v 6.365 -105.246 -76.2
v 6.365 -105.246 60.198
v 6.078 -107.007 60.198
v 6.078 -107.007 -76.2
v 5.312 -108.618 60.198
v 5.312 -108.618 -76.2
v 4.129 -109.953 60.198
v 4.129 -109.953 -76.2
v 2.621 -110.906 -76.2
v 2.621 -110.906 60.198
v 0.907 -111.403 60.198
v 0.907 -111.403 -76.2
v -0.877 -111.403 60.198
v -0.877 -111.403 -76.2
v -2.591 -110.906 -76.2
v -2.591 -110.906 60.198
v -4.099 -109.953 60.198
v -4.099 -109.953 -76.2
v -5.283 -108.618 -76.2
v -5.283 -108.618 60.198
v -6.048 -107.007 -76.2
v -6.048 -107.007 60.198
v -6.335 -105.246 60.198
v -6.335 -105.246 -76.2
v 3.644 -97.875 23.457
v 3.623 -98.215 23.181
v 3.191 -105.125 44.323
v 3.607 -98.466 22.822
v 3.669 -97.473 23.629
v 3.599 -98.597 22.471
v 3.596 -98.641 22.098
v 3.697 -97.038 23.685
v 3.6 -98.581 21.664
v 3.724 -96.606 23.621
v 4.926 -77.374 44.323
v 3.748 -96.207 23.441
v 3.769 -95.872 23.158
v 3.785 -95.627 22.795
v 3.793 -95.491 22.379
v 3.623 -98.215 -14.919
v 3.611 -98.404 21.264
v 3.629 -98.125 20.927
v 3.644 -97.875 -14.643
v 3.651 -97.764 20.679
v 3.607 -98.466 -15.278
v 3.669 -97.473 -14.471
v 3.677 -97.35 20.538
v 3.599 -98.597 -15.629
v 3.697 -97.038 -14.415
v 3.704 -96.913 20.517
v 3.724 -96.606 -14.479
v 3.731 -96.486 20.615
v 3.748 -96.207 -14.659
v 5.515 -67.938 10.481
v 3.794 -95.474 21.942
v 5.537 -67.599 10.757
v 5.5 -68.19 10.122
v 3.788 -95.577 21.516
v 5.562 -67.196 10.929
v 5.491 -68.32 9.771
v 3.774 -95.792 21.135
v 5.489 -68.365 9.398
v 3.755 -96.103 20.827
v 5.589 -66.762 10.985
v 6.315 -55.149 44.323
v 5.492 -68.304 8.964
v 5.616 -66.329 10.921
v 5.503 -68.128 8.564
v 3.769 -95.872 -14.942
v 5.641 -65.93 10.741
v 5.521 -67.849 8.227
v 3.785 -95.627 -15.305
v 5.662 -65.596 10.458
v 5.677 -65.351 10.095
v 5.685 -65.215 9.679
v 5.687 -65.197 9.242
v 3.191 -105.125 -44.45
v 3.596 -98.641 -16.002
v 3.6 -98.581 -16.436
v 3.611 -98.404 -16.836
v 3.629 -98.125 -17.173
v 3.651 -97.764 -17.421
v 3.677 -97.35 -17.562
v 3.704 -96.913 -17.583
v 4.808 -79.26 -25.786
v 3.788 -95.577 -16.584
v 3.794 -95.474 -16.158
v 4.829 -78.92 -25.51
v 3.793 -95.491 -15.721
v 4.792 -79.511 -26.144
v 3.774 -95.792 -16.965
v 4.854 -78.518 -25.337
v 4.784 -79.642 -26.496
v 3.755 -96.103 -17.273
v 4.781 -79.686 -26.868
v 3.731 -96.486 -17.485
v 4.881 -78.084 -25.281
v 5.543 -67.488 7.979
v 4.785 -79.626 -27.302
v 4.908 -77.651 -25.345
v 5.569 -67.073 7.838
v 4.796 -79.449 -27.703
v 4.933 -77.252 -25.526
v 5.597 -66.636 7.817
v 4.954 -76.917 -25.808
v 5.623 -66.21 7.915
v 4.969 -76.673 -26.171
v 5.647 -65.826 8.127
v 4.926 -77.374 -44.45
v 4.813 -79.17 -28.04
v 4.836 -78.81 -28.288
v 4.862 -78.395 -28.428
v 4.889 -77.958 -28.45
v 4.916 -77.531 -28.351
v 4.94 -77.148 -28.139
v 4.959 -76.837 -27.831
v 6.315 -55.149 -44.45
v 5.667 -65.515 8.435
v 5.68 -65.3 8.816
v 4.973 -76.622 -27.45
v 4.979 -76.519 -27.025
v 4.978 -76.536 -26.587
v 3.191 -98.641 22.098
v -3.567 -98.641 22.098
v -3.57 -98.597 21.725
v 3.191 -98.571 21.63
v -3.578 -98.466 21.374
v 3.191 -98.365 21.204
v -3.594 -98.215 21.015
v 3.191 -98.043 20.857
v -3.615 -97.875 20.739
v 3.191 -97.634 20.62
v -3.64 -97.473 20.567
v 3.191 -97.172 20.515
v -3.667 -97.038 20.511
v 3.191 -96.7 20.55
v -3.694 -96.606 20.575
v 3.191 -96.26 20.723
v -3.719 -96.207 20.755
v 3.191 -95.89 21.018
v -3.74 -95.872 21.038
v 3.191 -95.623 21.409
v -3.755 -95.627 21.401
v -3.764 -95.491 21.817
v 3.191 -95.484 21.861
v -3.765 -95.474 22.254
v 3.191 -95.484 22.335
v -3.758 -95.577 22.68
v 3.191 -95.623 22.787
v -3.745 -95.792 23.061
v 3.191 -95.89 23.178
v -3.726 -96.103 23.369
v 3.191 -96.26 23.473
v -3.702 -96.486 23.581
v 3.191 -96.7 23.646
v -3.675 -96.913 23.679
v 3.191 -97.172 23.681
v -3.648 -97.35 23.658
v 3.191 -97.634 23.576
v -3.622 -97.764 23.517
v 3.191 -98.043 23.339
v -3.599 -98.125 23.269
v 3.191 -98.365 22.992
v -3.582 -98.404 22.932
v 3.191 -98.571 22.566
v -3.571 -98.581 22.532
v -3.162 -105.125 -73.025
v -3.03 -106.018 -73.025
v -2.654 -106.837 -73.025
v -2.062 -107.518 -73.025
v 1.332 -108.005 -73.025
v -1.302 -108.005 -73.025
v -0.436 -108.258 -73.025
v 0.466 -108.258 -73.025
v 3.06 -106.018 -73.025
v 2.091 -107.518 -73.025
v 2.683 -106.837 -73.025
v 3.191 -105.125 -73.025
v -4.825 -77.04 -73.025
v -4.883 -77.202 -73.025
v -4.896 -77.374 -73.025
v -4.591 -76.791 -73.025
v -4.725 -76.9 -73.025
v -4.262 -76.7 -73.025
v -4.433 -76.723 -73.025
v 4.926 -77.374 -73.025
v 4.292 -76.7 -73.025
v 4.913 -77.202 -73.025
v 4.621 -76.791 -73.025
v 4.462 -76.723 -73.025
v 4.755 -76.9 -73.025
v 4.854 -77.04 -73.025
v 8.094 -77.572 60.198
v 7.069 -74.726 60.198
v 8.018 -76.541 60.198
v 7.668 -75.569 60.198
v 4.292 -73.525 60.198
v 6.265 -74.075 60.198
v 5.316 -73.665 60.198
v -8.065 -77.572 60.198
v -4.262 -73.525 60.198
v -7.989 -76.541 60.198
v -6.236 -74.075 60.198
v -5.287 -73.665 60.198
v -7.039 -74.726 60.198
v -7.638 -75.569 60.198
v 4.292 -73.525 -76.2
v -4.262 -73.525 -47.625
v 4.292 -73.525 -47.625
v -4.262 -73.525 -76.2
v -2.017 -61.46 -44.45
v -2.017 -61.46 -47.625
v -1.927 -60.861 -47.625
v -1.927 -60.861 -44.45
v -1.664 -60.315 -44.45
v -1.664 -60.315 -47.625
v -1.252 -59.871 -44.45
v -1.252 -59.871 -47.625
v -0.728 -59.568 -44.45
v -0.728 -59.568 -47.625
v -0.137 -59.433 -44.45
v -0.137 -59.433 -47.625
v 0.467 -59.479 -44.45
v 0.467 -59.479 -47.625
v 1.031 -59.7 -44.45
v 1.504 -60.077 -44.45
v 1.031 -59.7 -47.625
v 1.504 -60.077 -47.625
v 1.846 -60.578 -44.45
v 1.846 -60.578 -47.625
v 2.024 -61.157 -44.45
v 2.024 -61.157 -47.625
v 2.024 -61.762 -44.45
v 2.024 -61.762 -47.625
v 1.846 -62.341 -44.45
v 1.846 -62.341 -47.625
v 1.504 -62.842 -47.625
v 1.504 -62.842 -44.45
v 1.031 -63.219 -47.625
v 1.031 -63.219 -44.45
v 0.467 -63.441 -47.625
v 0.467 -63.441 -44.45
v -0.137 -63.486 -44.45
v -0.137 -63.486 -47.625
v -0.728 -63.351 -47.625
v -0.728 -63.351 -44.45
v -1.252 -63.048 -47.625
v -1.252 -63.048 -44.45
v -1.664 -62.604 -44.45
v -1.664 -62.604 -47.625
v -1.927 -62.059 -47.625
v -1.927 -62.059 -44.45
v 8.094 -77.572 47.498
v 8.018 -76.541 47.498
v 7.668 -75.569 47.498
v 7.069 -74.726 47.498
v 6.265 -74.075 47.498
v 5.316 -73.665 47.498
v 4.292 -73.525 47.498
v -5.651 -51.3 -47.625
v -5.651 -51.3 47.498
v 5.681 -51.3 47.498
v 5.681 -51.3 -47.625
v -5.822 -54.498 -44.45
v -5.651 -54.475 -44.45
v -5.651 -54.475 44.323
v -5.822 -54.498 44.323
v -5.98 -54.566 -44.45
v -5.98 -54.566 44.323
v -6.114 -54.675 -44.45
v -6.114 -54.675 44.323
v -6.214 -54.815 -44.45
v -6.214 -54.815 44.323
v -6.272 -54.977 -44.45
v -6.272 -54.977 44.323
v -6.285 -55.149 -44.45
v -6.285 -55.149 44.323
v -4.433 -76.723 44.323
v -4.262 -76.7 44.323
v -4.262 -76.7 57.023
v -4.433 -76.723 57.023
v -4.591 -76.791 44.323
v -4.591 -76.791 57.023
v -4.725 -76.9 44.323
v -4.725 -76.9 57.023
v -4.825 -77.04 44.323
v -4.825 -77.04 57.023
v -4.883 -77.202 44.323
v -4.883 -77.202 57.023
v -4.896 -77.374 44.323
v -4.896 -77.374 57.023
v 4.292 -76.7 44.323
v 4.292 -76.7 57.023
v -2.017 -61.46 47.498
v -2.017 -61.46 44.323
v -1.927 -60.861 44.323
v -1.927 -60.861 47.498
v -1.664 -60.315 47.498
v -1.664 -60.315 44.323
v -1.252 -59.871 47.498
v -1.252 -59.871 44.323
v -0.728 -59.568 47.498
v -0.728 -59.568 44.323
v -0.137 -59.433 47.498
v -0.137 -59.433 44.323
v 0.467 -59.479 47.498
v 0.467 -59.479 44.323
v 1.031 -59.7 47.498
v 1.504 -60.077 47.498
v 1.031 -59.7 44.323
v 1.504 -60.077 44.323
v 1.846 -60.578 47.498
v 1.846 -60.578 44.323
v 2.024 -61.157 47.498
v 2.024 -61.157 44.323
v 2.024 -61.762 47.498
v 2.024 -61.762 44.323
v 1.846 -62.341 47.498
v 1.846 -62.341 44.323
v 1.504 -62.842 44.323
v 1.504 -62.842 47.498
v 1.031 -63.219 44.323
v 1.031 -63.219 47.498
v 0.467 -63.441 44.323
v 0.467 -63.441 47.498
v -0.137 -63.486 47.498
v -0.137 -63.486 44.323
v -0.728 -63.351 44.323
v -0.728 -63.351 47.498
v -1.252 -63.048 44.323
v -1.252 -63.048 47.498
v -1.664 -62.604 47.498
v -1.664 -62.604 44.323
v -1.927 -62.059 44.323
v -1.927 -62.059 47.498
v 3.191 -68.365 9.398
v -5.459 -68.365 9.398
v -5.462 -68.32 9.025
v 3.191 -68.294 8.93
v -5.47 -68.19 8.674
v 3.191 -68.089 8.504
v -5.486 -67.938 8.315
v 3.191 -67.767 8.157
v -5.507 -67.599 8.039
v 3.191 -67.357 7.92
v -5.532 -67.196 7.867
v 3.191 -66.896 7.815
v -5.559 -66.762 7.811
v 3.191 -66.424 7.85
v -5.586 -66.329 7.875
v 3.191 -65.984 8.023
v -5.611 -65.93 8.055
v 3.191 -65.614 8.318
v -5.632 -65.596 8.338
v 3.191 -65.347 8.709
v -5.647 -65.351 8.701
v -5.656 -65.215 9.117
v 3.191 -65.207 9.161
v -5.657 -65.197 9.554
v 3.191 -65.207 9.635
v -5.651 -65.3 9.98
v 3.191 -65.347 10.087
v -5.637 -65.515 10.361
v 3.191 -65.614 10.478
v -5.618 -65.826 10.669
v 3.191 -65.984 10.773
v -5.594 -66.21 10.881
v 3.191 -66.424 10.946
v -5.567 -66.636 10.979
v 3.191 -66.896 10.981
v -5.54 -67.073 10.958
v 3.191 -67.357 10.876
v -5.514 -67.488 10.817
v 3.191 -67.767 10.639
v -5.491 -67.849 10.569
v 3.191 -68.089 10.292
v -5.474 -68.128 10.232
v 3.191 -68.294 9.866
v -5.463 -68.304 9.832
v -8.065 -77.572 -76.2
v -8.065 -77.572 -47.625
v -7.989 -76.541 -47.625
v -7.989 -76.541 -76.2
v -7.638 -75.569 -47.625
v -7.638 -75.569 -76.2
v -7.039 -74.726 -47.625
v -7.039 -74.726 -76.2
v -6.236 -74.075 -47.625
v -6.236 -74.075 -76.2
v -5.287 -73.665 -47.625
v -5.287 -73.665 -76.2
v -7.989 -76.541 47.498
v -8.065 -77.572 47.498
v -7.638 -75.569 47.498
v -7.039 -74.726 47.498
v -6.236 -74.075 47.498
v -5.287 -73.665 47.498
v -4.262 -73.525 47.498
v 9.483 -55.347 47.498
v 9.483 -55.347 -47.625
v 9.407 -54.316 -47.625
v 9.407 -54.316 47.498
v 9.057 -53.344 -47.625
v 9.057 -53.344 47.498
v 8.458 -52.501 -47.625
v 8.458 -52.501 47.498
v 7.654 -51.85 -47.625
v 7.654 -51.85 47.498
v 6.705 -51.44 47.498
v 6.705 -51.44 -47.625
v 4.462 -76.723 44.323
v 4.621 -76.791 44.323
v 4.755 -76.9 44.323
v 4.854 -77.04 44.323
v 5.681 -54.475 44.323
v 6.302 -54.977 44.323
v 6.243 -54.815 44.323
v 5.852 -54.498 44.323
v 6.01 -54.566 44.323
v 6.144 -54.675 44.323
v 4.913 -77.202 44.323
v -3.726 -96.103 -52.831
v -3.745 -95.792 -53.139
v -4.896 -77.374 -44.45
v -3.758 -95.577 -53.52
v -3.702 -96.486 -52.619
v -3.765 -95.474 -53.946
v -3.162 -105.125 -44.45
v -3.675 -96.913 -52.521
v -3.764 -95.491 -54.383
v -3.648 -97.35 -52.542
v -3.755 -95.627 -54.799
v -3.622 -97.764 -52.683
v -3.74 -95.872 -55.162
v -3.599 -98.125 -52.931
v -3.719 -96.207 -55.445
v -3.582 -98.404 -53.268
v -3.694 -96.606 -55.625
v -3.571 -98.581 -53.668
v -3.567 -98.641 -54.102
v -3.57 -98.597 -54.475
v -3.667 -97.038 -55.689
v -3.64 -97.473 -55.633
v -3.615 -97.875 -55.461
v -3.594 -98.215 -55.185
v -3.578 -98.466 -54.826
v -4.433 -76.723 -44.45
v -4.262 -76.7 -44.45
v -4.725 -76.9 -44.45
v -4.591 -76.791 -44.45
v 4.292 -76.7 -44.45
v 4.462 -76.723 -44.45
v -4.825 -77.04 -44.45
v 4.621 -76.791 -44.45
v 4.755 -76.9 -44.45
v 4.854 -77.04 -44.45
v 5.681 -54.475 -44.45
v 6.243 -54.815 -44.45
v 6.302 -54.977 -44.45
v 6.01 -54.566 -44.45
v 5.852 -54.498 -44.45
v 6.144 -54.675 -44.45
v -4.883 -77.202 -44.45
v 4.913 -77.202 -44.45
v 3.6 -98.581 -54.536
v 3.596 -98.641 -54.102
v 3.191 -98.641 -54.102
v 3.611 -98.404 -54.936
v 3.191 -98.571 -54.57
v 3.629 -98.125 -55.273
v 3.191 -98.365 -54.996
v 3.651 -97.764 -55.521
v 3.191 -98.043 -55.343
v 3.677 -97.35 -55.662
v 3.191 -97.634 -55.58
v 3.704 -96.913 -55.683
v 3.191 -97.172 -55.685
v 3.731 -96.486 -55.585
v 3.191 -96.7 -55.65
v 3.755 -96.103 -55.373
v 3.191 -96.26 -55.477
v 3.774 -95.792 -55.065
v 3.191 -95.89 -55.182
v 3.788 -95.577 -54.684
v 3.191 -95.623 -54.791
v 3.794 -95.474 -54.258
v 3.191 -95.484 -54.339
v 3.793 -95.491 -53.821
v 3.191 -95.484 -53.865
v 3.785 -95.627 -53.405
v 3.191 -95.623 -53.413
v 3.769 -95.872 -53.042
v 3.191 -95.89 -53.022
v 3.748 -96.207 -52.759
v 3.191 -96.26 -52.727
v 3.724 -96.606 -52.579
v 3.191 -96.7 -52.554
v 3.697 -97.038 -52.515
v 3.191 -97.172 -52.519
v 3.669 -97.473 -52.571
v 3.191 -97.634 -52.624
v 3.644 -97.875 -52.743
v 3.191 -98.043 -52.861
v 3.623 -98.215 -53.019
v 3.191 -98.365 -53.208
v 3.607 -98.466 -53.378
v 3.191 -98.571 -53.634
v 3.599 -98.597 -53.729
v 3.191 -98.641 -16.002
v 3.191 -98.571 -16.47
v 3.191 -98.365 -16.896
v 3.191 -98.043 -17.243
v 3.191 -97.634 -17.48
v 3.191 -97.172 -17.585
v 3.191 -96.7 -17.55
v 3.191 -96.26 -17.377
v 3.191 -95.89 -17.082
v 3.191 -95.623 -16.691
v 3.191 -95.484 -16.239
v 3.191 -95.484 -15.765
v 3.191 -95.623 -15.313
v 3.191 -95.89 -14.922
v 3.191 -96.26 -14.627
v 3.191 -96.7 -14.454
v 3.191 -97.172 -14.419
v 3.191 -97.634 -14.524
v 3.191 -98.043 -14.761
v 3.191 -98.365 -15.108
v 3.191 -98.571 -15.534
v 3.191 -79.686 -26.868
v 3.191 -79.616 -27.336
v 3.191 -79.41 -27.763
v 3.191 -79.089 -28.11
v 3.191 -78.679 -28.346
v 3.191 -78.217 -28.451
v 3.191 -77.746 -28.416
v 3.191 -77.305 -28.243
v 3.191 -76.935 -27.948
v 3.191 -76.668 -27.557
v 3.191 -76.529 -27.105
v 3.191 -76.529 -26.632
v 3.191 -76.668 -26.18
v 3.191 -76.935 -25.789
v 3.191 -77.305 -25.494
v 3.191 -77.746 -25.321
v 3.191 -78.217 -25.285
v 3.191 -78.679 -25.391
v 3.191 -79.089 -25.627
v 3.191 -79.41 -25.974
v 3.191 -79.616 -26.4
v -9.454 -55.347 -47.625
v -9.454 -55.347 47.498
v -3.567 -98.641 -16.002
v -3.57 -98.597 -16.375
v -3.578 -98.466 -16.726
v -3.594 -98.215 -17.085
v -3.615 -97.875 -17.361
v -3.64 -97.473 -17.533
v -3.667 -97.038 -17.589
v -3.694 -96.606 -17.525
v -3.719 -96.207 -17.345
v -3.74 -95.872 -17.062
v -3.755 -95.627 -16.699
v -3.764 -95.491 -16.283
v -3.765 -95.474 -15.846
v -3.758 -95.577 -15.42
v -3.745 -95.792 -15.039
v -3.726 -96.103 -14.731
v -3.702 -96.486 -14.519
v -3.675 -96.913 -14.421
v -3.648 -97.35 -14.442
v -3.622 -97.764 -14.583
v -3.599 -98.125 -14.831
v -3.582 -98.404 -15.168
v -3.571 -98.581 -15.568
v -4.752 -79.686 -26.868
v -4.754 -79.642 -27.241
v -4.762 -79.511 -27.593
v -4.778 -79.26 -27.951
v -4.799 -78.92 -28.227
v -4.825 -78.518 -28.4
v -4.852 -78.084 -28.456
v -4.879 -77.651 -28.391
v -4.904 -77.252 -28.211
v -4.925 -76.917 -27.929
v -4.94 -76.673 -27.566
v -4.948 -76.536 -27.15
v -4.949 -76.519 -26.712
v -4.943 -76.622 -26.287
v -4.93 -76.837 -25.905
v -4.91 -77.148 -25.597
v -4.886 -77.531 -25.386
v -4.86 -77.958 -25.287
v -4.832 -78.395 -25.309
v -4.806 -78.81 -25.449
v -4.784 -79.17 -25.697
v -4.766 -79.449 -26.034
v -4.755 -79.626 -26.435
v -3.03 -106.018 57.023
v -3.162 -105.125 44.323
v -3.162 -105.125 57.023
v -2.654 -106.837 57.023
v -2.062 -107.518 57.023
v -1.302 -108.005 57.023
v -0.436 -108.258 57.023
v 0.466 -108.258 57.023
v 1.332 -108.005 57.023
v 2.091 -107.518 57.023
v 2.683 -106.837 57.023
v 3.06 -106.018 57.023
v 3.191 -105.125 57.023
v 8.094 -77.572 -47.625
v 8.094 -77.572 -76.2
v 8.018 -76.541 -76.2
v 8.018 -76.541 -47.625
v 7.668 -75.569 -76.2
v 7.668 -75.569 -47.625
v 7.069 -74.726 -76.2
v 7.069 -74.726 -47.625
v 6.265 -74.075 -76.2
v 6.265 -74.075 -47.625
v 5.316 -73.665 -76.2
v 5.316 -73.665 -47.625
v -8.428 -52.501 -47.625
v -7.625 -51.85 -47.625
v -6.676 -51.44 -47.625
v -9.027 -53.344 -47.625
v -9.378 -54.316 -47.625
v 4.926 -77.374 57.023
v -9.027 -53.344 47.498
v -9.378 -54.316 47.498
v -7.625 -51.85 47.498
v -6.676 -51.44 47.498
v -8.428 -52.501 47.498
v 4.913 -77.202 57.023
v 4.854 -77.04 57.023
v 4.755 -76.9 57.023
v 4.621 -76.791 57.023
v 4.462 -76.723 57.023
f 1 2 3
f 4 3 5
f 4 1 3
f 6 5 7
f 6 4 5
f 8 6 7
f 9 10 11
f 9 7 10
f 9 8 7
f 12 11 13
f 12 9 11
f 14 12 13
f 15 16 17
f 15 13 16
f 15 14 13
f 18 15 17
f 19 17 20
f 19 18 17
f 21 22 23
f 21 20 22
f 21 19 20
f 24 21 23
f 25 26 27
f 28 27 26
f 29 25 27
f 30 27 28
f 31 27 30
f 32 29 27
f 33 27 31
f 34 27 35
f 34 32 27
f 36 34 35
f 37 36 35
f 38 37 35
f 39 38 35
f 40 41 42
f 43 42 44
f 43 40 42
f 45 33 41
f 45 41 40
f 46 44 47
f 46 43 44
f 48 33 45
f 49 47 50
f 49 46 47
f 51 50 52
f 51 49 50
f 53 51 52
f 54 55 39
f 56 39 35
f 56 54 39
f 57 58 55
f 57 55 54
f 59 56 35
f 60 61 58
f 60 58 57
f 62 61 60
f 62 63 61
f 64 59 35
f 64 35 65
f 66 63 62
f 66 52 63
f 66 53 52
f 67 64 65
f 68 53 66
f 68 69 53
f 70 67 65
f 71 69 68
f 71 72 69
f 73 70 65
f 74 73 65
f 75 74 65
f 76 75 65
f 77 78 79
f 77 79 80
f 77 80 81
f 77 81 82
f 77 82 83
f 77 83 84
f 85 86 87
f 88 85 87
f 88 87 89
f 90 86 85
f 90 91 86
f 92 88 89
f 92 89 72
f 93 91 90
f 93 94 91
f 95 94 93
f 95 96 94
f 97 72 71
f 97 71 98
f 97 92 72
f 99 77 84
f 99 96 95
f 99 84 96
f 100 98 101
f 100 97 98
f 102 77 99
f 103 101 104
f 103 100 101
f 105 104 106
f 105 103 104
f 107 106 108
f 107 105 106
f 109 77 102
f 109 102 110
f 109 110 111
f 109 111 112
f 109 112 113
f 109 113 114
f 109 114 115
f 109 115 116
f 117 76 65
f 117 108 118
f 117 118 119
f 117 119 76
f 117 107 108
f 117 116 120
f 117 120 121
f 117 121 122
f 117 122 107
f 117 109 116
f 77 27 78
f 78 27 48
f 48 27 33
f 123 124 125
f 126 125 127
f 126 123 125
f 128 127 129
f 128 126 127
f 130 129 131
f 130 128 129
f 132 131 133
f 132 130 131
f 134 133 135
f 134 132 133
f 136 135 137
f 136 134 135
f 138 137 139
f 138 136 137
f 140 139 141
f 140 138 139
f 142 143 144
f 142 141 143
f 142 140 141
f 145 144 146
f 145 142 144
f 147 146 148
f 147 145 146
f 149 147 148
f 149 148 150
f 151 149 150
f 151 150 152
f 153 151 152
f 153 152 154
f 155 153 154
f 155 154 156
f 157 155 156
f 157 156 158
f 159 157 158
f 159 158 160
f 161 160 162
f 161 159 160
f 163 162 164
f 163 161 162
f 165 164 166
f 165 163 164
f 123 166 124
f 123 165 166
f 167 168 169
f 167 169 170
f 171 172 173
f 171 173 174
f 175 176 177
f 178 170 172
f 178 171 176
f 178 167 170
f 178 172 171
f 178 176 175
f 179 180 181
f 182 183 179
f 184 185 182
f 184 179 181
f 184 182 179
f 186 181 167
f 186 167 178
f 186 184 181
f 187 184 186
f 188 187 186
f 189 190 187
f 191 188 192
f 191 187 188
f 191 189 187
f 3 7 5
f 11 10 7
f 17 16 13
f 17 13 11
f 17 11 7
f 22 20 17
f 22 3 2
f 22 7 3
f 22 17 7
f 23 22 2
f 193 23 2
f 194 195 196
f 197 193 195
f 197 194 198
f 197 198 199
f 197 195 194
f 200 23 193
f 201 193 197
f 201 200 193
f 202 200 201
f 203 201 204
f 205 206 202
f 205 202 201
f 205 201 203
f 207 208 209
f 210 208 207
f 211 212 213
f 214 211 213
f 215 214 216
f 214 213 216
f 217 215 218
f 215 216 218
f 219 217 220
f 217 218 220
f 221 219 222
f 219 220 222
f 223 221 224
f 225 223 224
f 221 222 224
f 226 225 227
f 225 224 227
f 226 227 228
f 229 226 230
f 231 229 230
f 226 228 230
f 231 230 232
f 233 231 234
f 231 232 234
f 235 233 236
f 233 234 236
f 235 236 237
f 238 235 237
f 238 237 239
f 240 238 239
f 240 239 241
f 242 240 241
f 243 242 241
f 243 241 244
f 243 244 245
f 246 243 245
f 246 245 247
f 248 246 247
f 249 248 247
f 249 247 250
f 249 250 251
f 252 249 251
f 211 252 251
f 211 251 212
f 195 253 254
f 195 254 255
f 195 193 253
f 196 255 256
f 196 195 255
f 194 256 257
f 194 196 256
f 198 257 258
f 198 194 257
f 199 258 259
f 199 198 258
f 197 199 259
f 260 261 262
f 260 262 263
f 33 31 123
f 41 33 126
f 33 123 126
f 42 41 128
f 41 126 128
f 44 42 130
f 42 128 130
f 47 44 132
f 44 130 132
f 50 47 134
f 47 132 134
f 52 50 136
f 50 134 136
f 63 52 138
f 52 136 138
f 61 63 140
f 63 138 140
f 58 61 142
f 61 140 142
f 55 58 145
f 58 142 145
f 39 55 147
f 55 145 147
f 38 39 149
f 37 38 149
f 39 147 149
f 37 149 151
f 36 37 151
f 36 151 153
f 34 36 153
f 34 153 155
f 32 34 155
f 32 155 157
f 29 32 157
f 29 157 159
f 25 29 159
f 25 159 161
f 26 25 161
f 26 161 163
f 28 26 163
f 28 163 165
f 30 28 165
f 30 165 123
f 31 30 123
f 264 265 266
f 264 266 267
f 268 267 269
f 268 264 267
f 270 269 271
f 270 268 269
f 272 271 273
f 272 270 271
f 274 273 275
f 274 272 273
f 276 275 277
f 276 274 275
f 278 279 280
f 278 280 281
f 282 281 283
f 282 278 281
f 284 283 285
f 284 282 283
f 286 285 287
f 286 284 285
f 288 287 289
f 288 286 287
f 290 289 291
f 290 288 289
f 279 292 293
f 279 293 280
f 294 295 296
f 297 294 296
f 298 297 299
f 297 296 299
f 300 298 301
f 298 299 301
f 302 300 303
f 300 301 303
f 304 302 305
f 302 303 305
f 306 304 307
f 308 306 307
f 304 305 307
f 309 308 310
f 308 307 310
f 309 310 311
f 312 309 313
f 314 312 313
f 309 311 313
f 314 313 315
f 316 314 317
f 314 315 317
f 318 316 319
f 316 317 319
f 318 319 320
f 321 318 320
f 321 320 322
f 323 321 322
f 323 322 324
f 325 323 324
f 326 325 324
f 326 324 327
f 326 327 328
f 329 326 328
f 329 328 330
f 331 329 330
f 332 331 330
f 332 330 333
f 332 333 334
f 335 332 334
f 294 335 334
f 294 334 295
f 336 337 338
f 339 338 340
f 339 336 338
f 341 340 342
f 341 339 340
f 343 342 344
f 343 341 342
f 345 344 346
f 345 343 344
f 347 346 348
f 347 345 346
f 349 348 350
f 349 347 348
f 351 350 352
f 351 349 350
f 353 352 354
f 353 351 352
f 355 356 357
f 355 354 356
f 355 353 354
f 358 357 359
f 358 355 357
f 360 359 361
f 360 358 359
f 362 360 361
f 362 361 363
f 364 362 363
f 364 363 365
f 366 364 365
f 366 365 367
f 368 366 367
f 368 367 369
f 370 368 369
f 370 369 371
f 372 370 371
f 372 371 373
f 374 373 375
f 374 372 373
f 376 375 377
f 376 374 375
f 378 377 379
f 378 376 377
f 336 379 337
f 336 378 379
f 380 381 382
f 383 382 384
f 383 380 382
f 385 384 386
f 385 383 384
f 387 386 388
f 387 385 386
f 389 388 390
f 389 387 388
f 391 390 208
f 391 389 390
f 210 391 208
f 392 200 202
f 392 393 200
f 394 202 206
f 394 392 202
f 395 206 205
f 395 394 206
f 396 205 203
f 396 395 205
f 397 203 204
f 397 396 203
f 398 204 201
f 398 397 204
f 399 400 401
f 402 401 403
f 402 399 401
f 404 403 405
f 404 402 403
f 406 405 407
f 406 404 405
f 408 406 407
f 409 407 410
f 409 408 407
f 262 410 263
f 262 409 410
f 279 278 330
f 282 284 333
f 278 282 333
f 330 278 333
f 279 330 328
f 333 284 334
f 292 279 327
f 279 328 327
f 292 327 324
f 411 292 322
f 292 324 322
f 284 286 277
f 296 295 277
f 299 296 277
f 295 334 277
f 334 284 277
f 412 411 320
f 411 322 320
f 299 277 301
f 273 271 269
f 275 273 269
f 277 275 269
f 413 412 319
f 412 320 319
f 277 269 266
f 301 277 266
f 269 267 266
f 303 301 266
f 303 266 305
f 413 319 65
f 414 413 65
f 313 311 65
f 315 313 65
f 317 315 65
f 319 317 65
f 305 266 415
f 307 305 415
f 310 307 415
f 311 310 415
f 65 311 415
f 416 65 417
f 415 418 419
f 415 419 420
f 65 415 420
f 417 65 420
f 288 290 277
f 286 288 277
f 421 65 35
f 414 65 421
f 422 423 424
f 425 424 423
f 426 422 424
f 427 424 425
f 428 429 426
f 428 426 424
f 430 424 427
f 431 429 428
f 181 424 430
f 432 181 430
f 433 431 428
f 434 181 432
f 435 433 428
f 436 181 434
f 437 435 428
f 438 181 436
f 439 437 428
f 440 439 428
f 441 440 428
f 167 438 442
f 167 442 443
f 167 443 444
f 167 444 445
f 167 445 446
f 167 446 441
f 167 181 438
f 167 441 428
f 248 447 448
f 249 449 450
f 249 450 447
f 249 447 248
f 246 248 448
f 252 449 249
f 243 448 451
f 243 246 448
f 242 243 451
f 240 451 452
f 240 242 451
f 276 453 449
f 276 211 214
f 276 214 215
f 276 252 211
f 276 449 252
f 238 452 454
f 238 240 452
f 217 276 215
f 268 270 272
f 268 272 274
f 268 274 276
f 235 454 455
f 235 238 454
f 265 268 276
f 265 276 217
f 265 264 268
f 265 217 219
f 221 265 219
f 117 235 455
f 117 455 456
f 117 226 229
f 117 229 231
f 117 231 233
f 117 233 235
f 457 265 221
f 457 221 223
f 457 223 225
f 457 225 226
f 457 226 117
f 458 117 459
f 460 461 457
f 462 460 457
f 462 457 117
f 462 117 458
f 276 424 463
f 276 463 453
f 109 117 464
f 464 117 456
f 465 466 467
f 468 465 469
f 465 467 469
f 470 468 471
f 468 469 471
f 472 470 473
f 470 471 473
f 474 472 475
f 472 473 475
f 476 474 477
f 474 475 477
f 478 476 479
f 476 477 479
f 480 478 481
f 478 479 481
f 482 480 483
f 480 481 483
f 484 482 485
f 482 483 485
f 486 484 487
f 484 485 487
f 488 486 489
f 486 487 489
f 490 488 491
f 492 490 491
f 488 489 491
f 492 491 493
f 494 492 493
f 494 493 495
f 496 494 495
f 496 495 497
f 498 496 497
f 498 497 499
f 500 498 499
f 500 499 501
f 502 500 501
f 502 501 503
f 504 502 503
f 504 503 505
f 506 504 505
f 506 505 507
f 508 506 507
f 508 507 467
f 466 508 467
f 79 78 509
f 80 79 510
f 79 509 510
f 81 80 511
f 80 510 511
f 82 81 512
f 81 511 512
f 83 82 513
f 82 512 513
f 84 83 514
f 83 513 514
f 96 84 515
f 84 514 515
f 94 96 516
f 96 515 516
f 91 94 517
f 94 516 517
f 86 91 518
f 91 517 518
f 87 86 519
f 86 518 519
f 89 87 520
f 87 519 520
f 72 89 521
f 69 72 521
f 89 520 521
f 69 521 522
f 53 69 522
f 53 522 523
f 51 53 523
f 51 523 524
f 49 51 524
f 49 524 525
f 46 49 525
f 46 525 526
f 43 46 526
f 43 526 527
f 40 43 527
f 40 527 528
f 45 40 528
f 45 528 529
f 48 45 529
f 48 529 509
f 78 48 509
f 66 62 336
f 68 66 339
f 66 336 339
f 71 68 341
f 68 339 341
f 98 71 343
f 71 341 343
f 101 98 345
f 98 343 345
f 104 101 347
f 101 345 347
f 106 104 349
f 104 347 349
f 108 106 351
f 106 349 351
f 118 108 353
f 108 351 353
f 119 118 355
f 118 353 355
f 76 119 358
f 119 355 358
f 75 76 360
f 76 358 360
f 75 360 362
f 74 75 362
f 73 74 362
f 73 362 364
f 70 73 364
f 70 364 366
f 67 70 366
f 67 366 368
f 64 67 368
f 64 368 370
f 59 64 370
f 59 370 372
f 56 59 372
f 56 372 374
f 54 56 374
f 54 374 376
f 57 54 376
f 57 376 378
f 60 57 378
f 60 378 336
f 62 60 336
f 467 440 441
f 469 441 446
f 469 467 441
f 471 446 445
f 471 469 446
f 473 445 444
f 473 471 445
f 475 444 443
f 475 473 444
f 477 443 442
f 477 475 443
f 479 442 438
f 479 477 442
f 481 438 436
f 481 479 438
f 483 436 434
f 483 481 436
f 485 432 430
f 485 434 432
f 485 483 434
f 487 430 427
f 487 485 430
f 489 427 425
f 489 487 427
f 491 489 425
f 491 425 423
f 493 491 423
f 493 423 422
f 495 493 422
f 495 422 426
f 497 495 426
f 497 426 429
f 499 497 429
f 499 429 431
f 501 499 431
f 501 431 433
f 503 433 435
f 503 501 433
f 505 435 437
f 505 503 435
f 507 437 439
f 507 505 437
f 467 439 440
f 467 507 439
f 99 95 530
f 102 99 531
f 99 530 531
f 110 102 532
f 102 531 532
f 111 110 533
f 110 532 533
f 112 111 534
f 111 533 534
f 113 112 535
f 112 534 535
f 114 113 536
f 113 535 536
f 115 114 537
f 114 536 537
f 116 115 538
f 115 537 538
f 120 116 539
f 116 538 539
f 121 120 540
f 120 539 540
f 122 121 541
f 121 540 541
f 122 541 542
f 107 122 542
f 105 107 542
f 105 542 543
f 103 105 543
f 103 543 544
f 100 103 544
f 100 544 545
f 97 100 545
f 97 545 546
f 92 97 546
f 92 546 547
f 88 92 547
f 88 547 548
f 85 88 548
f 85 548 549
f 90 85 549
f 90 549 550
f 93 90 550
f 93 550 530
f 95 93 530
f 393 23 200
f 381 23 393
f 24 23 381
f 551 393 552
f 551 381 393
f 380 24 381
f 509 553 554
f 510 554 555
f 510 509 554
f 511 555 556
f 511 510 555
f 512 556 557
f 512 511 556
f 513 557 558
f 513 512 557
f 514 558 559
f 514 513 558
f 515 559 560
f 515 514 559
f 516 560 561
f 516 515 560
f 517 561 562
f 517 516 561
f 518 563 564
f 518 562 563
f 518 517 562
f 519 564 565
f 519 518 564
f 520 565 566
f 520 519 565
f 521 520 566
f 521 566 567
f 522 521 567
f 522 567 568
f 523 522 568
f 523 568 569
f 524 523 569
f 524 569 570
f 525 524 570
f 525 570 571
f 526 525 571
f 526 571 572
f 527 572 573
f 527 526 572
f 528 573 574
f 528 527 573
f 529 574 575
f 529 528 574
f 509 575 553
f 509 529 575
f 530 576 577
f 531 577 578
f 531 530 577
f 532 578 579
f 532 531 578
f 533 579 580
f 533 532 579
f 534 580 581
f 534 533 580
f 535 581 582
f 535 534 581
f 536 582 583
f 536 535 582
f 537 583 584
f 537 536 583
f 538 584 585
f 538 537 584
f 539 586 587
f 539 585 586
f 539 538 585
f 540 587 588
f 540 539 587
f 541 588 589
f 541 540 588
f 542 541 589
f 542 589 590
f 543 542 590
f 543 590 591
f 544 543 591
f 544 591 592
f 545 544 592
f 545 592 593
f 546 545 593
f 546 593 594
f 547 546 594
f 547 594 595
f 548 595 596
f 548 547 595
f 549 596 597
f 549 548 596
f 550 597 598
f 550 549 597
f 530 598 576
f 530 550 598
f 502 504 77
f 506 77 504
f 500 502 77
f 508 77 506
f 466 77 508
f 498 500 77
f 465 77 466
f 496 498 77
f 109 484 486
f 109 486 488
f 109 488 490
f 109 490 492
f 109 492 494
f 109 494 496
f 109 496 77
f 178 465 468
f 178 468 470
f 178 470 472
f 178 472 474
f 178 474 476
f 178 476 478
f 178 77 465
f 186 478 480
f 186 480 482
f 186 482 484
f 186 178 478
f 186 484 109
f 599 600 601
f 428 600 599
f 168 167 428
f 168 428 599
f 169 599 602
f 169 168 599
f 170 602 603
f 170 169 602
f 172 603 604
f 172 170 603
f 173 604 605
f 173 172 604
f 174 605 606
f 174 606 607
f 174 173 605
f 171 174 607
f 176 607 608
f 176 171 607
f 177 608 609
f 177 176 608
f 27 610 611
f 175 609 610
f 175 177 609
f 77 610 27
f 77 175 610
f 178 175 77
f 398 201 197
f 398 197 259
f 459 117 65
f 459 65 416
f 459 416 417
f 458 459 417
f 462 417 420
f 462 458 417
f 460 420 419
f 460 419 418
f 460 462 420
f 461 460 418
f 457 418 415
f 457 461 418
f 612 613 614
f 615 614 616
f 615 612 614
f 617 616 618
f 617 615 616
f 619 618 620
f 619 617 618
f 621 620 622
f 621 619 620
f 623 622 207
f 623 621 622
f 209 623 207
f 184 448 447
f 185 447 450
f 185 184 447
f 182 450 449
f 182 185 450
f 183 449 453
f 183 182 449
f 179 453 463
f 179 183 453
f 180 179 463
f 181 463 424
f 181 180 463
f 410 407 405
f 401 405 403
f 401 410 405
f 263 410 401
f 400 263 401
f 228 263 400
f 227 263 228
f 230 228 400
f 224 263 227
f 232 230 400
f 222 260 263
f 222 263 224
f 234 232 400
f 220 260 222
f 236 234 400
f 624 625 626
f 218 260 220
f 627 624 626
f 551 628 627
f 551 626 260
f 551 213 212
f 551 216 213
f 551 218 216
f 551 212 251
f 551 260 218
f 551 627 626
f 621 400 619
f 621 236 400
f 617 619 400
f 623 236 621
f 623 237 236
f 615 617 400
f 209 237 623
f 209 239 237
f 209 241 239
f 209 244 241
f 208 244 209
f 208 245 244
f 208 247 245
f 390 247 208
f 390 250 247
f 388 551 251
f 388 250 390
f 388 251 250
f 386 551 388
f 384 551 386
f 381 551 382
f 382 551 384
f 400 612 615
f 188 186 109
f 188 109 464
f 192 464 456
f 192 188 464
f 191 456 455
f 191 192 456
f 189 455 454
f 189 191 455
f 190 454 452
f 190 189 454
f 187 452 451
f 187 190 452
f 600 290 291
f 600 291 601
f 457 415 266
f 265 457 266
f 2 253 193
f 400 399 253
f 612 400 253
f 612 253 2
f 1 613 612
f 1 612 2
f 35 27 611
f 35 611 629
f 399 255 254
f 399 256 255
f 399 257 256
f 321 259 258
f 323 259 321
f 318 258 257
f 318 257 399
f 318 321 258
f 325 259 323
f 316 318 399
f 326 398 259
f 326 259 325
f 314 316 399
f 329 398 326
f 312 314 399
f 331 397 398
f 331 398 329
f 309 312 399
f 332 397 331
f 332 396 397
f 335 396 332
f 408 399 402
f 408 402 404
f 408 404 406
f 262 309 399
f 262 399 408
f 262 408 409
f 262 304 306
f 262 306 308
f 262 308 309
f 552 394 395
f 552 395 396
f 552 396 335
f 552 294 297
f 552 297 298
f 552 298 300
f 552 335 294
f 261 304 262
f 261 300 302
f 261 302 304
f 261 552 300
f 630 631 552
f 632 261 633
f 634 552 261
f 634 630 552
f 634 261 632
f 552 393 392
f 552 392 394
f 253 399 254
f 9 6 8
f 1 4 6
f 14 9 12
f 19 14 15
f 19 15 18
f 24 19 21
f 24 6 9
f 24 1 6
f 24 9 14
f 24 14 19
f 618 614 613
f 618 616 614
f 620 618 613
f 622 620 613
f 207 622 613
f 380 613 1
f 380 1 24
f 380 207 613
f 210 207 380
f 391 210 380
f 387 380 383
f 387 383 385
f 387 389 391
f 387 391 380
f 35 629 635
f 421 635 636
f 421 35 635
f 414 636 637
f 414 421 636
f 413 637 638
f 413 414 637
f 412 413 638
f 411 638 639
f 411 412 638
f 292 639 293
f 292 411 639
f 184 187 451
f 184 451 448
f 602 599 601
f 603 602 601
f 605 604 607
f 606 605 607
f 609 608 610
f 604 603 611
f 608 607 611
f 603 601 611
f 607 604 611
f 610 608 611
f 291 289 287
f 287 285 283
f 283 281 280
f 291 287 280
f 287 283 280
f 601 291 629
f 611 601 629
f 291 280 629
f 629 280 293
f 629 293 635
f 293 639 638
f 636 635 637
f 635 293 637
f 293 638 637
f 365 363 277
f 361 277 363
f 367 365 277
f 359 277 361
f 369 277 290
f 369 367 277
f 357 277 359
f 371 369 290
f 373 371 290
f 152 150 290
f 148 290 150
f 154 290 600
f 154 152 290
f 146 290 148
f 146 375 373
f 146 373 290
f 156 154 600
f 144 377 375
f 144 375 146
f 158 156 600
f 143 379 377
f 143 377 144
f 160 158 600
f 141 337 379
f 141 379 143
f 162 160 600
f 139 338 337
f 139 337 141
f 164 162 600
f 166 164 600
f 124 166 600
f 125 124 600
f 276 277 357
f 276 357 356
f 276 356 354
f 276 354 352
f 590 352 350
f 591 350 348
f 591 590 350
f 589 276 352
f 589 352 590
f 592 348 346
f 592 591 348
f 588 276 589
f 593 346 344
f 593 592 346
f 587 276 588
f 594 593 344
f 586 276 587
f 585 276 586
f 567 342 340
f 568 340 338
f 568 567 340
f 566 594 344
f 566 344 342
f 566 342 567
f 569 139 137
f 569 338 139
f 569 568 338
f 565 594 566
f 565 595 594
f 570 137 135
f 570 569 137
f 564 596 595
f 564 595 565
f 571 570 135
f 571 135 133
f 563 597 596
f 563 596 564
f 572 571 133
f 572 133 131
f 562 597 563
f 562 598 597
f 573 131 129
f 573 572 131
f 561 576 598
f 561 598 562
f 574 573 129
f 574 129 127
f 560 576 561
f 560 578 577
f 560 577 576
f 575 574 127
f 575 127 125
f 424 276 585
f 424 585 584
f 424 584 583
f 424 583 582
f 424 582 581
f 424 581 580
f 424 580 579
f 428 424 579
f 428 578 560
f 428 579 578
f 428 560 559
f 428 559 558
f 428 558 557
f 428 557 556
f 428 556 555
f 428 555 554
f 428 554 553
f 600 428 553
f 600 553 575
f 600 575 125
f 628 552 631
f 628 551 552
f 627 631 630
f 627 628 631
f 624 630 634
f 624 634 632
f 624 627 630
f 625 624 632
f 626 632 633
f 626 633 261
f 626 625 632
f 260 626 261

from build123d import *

# Parameters (mm, degrees)
BOSS_EXTRUDE1_DEPTH             = 76.2
BOSS_EXTRUDE1_DEPTH_BACK        = 76.2
CUT_EXTRUDE1_DEPTH              = 136.619651209
CUT_EXTRUDE1_DEPTH_BACK         = 136.619651209
FILLET1_R                       = 3.81
SHELL1_START                    = -44.45
SHELL1_DEPTH                    = 88.773
SHELL1_START_2                  = -73.025
SHELL1_2_DEPTH                  = 130.048
SKETCH14_R                      = 2.032
CUT_EXTRUDE8_DEPTH              = 156.372005628
BOSS_EXTRUDE4_REACH             = 137.201
SKETCH15_R                      = 1.5875
BOSS_EXTRUDE4_DIRECTION_2_REACH = 137.201


# Read off the part's stored shape, not the designer's step: Shell1
with BuildPart() as part:
    # Sketch1 → Boss-Extrude1 (new, two sides: drawn at the far end of the back side and taken through both)
    with BuildSketch(Plane.XY.offset(-BOSS_EXTRUDE1_DEPTH_BACK)):
        with BuildLine():
            Line((-6.335258536, -105.245804705), (-12.685258536, -3.645804705))
            ThreePointArc((-12.685258536, -3.645804705), (0.014741464, 8.866413132), (12.714741464, -3.645804705))
            Line((12.714741464, -3.645804705), (6.364741464, -105.245804705))
            ThreePointArc((6.364741464, -105.245804705), (0.014741464, -111.465623147), (-6.335258536, -105.245804705))
        make_face()
    extrude(amount=BOSS_EXTRUDE1_DEPTH + BOSS_EXTRUDE1_DEPTH_BACK)

    # Sketch4 → Cut-Extrude1 (cut, two sides: drawn at the far end of the back side and taken through both)
    with BuildSketch(Plane(origin=(0, 0, 0), x_dir=(0, 0, -1), z_dir=(1, 0, 0)).offset(-CUT_EXTRUDE1_DEPTH_BACK)):
        Polygon((-47.498, -73.524605007), (-47.498, -51.299605007), (47.625, -51.299605007), (47.625, -73.524605007), (76.2, -73.524605007), (76.2, 8.866413132), (-76.2, 8.866413132), (-76.2, -28.682279346), (-76.2, -111.465623147), (-60.198, -111.465623147), (-60.198, -73.524605007), align=None)
    extrude(amount=CUT_EXTRUDE1_DEPTH + CUT_EXTRUDE1_DEPTH_BACK, mode=Mode.SUBTRACT)

    # Fillet1
    fillet1_edges = [part.edges().sort_by_distance(p)[0] for p in [
        (8.347316445, -73.524605007, 53.848),
        (9.736378945, -51.299605007, -0.0635),
        (-9.706896017, -51.299605007, -0.0635),
        (-8.317833517, -73.524605007, 53.848),
        (-8.317833517, -73.524605007, -61.9125),
        (8.347316445, -73.524605007, -61.9125),
    ]]
    fillet(fillet1_edges, radius=FILLET1_R)

    # Shell1 outline → Shell1 (cut)
    with BuildSketch(Plane.XY.offset(SHELL1_START)):
        with BuildLine():
            ThreePointArc((-3.161602106, -105.125185529), (0.014741465, -108.290623147), (3.191085035, -105.125185529))
            Line((3.191085035, -105.125185529), (6.314583179, -55.149215219))
            ThreePointArc((6.314583179, -55.149215219), (6.143625088, -54.674822007), (5.680819792, -54.474605007))
            Line((5.680819792, -54.474605007), (-5.651336863, -54.474605007))
            ThreePointArc((-5.651336863, -54.474605007), (-6.114142159, -54.674822006), (-6.285100251, -55.149215219))
            Line((-6.285100251, -55.149215219), (-3.161602106, -105.125185529))
        make_face()
    extrude(amount=SHELL1_DEPTH, mode=Mode.SUBTRACT)

    # Shell1 2 outline → Shell1 2 (cut)
    with BuildSketch(Plane.XY.offset(SHELL1_START_2)):
        with BuildLine():
            Line((-4.896037751, -77.374215219), (-3.161602106, -105.125185529))
            ThreePointArc((-3.161602106, -105.125185529), (0.014741465, -108.290623147), (3.191085035, -105.125185529))
            Line((3.191085035, -105.125185529), (4.925520679, -77.374215219))
            ThreePointArc((4.925520679, -77.374215219), (4.754562588, -76.899822007), (4.291757292, -76.699605007))
            Line((4.291757292, -76.699605007), (-4.262274363, -76.699605007))
            ThreePointArc((-4.262274363, -76.699605007), (-4.725079659, -76.899822006), (-4.896037751, -77.374215219))
        make_face()
    extrude(amount=SHELL1_2_DEPTH, mode=Mode.SUBTRACT)

    # Sketch14 → Cut-Extrude8 (cut, through all)
    with BuildSketch(Plane(origin=(0, 0, -47.625), x_dir=(-1, 0, 0), z_dir=(0, 0, -1))):
        with Locations((-0.014741464, -61.459605007)):
            Circle(SKETCH14_R)
    extrude(amount=-CUT_EXTRUDE8_DEPTH, mode=Mode.SUBTRACT)

    # Boss-Extrude4: up to this plane
    boss_extrude4_end = Plane(origin=(3.195924528, -105.047753647, -76.2), z_dir=(0.9980525784828886, -0.062378286155180485, 0))
    # Sketch15 → Boss-Extrude4 (add, up to the surface)
    with BuildSketch(Plane(origin=(3.191103822, -0.502900096, 0), x_dir=(0, 0, -1), z_dir=(1, 0, 0)), mode=Mode.PRIVATE) as boss_extrude4_sk1:
        with Locations(Location((-9.398, -66.274366182, 0), (0, 0, 270))):
            Circle(SKETCH15_R)
    boss_extrude4_tool1 = split(extrude(boss_extrude4_sk1.sketch, amount=BOSS_EXTRUDE4_REACH, mode=Mode.PRIVATE), bisect_by=boss_extrude4_end, keep=Keep.BOTH, mode=Mode.PRIVATE)
    add(boss_extrude4_tool1.solids().sort_by_distance((3.191104, -66.777266, 9.398))[0])
    # Sketch15 → Boss-Extrude4 (add, up to the surface)
    with BuildSketch(Plane(origin=(3.191103822, -0.502900096, 0), x_dir=(0, 0, -1), z_dir=(1, 0, 0)), mode=Mode.PRIVATE) as boss_extrude4_sk2:
        with Locations(Location((26.868345804, -77.595887652, 0), (0, 0, 270))):
            Circle(SKETCH15_R)
    boss_extrude4_tool2 = split(extrude(boss_extrude4_sk2.sketch, amount=BOSS_EXTRUDE4_REACH, mode=Mode.PRIVATE), bisect_by=boss_extrude4_end, keep=Keep.BOTH, mode=Mode.PRIVATE)
    add(boss_extrude4_tool2.solids().sort_by_distance((3.191104, -78.098788, -26.868346))[0])
    # Sketch15 → Boss-Extrude4 (add, up to the surface)
    with BuildSketch(Plane(origin=(3.191103822, -0.502900096, 0), x_dir=(0, 0, -1), z_dir=(1, 0, 0)), mode=Mode.PRIVATE) as boss_extrude4_sk3:
        with Locations(Location((-22.098, -96.55076585, 0), (0, 0, 270))):
            Circle(SKETCH15_R)
    boss_extrude4_tool3 = split(extrude(boss_extrude4_sk3.sketch, amount=BOSS_EXTRUDE4_REACH, mode=Mode.PRIVATE), bisect_by=boss_extrude4_end, keep=Keep.BOTH, mode=Mode.PRIVATE)
    add(boss_extrude4_tool3.solids().sort_by_distance((3.191104, -97.053666, 22.098))[0])
    # Sketch15 → Boss-Extrude4 (add, up to the surface)
    with BuildSketch(Plane(origin=(3.191103822, -0.502900096, 0), x_dir=(0, 0, -1), z_dir=(1, 0, 0)), mode=Mode.PRIVATE) as boss_extrude4_sk4:
        with Locations(Location((16.002, -96.55076585, 0), (0, 0, 270))):
            Circle(SKETCH15_R)
    boss_extrude4_tool4 = split(extrude(boss_extrude4_sk4.sketch, amount=BOSS_EXTRUDE4_REACH, mode=Mode.PRIVATE), bisect_by=boss_extrude4_end, keep=Keep.BOTH, mode=Mode.PRIVATE)
    add(boss_extrude4_tool4.solids().sort_by_distance((3.191104, -97.053666, -16.002))[0])
    # Sketch15 → Boss-Extrude4 (add, up to the surface)
    with BuildSketch(Plane(origin=(3.191103822, -0.502900096, 0), x_dir=(0, 0, -1), z_dir=(1, 0, 0)), mode=Mode.PRIVATE) as boss_extrude4_sk5:
        with Locations(Location((54.102, -96.55076585, 0), (0, 0, 270))):
            Circle(SKETCH15_R)
    boss_extrude4_tool5 = split(extrude(boss_extrude4_sk5.sketch, amount=BOSS_EXTRUDE4_REACH, mode=Mode.PRIVATE), bisect_by=boss_extrude4_end, keep=Keep.BOTH, mode=Mode.PRIVATE)
    add(boss_extrude4_tool5.solids().sort_by_distance((3.191104, -97.053666, -54.102))[0])

    # Boss-Extrude4 direction 2: up to this plane
    boss_extrude4_direction_2_end = Plane(origin=(-3.166441599, -105.047753647, -76.2), z_dir=(-0.9980525784828886, -0.0623782861551806, 0))
    # Sketch15 → Boss-Extrude4 direction 2 (add, up to the surface)
    with BuildSketch(Plane(origin=(3.191103822, -0.502900096, 0), x_dir=(0, 0, -1), z_dir=(1, 0, 0)), mode=Mode.PRIVATE) as boss_extrude4_direction_2_sk1:
        with Locations(Location((-9.398, -66.274366182, 0), (0, 0, 270))):
            Circle(SKETCH15_R)
    boss_extrude4_direction_2_tool1 = split(extrude(boss_extrude4_direction_2_sk1.sketch, amount=-BOSS_EXTRUDE4_DIRECTION_2_REACH, mode=Mode.PRIVATE), bisect_by=boss_extrude4_direction_2_end, keep=Keep.BOTH, mode=Mode.PRIVATE)
    add(boss_extrude4_direction_2_tool1.solids().sort_by_distance((3.191104, -66.777266, 9.398))[0])
    # Sketch15 → Boss-Extrude4 direction 2 (add, up to the surface)
    with BuildSketch(Plane(origin=(3.191103822, -0.502900096, 0), x_dir=(0, 0, -1), z_dir=(1, 0, 0)), mode=Mode.PRIVATE) as boss_extrude4_direction_2_sk2:
        with Locations(Location((26.868345804, -77.595887652, 0), (0, 0, 270))):
            Circle(SKETCH15_R)
    boss_extrude4_direction_2_tool2 = split(extrude(boss_extrude4_direction_2_sk2.sketch, amount=-BOSS_EXTRUDE4_DIRECTION_2_REACH, mode=Mode.PRIVATE), bisect_by=boss_extrude4_direction_2_end, keep=Keep.BOTH, mode=Mode.PRIVATE)
    add(boss_extrude4_direction_2_tool2.solids().sort_by_distance((3.191104, -78.098788, -26.868346))[0])
    # Sketch15 → Boss-Extrude4 direction 2 (add, up to the surface)
    with BuildSketch(Plane(origin=(3.191103822, -0.502900096, 0), x_dir=(0, 0, -1), z_dir=(1, 0, 0)), mode=Mode.PRIVATE) as boss_extrude4_direction_2_sk3:
        with Locations(Location((-22.098, -96.55076585, 0), (0, 0, 270))):
            Circle(SKETCH15_R)
    boss_extrude4_direction_2_tool3 = split(extrude(boss_extrude4_direction_2_sk3.sketch, amount=-BOSS_EXTRUDE4_DIRECTION_2_REACH, mode=Mode.PRIVATE), bisect_by=boss_extrude4_direction_2_end, keep=Keep.BOTH, mode=Mode.PRIVATE)
    add(boss_extrude4_direction_2_tool3.solids().sort_by_distance((3.191104, -97.053666, 22.098))[0])
    # Sketch15 → Boss-Extrude4 direction 2 (add, up to the surface)
    with BuildSketch(Plane(origin=(3.191103822, -0.502900096, 0), x_dir=(0, 0, -1), z_dir=(1, 0, 0)), mode=Mode.PRIVATE) as boss_extrude4_direction_2_sk4:
        with Locations(Location((16.002, -96.55076585, 0), (0, 0, 270))):
            Circle(SKETCH15_R)
    boss_extrude4_direction_2_tool4 = split(extrude(boss_extrude4_direction_2_sk4.sketch, amount=-BOSS_EXTRUDE4_DIRECTION_2_REACH, mode=Mode.PRIVATE), bisect_by=boss_extrude4_direction_2_end, keep=Keep.BOTH, mode=Mode.PRIVATE)
    add(boss_extrude4_direction_2_tool4.solids().sort_by_distance((3.191104, -97.053666, -16.002))[0])
    # Sketch15 → Boss-Extrude4 direction 2 (add, up to the surface)
    with BuildSketch(Plane(origin=(3.191103822, -0.502900096, 0), x_dir=(0, 0, -1), z_dir=(1, 0, 0)), mode=Mode.PRIVATE) as boss_extrude4_direction_2_sk5:
        with Locations(Location((54.102, -96.55076585, 0), (0, 0, 270))):
            Circle(SKETCH15_R)
    boss_extrude4_direction_2_tool5 = split(extrude(boss_extrude4_direction_2_sk5.sketch, amount=-BOSS_EXTRUDE4_DIRECTION_2_REACH, mode=Mode.PRIVATE), bisect_by=boss_extrude4_direction_2_end, keep=Keep.BOTH, mode=Mode.PRIVATE)
    add(boss_extrude4_direction_2_tool5.solids().sort_by_distance((3.191104, -97.053666, -54.102))[0])


solid = part.part
